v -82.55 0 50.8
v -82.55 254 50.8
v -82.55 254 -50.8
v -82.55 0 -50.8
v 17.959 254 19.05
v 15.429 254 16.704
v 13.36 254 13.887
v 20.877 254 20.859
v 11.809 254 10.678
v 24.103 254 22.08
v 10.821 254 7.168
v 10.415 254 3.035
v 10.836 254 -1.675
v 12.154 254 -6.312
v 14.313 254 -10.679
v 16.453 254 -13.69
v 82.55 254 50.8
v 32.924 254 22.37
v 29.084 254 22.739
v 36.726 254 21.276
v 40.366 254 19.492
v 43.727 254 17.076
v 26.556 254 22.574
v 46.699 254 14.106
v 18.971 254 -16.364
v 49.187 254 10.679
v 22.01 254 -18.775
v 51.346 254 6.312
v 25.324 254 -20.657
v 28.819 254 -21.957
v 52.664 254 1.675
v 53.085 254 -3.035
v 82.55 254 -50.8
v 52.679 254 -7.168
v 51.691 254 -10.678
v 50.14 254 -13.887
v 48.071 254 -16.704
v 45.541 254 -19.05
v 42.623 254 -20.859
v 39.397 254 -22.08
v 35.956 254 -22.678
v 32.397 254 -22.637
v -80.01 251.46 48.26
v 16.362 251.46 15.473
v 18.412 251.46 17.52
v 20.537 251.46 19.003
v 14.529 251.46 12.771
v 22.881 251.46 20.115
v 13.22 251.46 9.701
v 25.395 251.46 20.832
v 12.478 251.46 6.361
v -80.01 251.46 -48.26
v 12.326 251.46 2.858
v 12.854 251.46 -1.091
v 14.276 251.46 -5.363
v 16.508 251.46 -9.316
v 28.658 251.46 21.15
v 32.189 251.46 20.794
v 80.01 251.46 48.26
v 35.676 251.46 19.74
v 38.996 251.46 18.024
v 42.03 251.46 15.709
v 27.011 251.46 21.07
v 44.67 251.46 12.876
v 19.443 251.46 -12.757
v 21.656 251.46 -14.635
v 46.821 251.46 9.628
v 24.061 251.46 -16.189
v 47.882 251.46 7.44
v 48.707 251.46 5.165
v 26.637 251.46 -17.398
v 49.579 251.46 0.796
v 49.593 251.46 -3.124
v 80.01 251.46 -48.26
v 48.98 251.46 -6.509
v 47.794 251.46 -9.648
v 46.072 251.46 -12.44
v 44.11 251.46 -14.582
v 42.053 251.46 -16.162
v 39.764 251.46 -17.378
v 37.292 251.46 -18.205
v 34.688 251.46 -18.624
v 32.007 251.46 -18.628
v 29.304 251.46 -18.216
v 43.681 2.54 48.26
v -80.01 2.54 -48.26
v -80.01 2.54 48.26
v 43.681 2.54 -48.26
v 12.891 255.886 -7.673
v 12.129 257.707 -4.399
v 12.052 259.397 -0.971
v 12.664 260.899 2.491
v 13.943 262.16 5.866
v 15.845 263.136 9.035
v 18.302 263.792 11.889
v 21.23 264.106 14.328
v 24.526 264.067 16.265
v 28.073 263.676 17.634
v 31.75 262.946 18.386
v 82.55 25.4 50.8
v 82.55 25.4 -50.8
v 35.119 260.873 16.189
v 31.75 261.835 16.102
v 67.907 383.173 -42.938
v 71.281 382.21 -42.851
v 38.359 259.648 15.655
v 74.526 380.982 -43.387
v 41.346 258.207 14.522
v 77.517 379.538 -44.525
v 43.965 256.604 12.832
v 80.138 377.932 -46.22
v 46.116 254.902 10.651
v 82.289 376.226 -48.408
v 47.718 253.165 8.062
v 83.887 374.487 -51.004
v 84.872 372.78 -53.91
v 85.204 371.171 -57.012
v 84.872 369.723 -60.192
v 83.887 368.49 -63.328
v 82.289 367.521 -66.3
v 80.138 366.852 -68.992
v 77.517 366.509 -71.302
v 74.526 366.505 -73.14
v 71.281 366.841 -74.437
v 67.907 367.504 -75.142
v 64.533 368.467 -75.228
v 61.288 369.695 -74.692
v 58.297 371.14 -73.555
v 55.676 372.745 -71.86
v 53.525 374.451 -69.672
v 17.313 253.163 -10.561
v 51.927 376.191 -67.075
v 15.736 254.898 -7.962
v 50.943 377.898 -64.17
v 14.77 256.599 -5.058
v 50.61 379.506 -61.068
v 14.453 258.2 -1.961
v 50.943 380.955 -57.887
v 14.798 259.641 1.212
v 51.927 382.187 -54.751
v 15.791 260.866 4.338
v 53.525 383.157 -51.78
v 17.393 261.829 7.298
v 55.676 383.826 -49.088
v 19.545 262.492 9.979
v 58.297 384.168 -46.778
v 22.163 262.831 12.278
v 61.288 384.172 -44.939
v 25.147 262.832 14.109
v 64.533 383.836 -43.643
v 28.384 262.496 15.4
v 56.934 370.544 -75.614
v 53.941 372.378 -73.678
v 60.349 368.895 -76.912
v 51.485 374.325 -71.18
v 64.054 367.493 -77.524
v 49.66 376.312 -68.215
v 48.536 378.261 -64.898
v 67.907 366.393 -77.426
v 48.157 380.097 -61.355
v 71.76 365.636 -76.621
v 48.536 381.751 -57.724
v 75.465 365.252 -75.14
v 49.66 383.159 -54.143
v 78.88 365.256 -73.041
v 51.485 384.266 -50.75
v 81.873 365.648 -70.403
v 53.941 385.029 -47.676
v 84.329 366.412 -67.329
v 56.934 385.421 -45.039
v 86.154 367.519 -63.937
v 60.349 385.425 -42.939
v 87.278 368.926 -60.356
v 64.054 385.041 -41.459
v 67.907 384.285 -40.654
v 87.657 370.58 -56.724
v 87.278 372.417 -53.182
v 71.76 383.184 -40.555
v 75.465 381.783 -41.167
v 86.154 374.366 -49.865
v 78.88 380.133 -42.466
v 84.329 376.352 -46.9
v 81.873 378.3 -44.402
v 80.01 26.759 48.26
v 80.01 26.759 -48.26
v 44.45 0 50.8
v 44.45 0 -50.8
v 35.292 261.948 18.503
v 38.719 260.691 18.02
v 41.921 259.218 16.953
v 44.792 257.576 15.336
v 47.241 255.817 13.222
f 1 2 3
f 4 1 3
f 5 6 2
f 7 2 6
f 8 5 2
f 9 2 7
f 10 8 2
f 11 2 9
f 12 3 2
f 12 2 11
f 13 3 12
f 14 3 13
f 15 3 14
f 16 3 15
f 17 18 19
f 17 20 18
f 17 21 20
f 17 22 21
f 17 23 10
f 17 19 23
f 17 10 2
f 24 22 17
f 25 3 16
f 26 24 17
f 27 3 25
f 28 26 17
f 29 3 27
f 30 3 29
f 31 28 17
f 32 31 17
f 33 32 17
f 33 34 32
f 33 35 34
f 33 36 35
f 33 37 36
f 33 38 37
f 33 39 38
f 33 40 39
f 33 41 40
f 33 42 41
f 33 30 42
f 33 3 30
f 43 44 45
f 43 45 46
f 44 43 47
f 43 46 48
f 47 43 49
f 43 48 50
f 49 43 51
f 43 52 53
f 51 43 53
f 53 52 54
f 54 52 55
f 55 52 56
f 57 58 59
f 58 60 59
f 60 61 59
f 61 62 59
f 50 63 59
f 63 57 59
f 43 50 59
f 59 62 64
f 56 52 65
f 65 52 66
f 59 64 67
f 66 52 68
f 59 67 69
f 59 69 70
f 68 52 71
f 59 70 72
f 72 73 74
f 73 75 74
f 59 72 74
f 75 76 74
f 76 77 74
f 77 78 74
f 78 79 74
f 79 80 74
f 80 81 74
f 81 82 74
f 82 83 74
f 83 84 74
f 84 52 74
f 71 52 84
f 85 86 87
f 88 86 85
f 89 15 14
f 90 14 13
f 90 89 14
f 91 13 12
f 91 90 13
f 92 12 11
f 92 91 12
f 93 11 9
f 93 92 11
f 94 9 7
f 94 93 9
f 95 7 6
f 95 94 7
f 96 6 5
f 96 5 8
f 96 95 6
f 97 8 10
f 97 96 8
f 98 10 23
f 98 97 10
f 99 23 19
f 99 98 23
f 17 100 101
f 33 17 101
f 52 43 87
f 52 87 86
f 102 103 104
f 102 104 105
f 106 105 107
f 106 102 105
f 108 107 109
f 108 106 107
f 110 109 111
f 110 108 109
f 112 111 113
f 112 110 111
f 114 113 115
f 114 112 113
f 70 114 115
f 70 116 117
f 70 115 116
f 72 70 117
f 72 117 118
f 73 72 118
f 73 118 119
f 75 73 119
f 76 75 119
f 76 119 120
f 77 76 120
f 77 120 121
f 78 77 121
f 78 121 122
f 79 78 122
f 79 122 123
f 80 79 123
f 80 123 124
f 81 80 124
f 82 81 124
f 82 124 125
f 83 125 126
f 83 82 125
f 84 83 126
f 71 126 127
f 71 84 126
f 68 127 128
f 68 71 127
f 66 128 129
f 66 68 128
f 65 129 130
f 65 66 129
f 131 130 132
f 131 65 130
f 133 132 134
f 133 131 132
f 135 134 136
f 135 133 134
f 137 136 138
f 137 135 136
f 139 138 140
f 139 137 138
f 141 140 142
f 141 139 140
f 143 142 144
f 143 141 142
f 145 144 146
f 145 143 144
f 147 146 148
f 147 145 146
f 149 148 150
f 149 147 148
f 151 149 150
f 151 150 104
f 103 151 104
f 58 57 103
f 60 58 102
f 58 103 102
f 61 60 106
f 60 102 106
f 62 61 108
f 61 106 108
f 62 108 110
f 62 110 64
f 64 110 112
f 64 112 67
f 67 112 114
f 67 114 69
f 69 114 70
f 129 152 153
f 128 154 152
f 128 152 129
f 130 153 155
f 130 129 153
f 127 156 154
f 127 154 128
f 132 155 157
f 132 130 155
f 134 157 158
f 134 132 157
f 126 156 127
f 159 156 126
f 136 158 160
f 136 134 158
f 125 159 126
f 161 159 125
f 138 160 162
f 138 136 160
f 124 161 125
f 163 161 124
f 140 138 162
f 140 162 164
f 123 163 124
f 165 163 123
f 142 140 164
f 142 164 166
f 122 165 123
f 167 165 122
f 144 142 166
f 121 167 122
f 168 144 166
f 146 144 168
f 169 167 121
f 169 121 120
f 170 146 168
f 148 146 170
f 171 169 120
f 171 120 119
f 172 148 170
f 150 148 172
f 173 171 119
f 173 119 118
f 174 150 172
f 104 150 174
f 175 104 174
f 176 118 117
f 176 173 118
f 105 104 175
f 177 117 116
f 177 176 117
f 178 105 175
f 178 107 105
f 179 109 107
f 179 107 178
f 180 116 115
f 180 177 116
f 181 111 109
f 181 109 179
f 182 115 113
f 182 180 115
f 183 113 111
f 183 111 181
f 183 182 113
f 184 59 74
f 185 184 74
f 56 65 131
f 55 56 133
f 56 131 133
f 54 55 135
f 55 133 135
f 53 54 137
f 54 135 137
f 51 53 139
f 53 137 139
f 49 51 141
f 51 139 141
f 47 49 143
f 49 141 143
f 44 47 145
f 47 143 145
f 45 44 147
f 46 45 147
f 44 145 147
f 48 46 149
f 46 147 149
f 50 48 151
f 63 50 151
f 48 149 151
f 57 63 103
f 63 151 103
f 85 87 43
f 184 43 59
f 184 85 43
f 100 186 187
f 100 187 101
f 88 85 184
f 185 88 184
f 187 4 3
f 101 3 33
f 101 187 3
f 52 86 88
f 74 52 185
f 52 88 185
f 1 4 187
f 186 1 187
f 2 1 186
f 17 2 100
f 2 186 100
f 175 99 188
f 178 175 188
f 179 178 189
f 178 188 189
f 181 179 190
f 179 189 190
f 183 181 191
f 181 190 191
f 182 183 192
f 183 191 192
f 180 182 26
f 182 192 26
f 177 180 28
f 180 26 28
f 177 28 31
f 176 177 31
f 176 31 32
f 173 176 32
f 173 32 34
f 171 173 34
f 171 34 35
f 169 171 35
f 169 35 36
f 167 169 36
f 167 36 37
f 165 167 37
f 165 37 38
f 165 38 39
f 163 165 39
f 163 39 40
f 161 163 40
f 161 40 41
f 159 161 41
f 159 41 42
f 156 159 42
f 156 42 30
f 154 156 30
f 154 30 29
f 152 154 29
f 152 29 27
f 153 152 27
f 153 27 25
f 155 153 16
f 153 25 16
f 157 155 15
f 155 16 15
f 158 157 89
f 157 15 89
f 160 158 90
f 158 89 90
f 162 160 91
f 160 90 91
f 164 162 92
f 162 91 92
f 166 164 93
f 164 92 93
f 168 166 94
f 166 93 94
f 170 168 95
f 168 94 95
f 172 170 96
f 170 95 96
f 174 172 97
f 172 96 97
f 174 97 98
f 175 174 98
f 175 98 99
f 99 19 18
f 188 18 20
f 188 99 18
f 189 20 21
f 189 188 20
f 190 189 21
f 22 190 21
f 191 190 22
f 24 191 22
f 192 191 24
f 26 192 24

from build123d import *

# Parameters (mm, degrees)
SKETCH1_W                       = 165.1
SKETCH1_H                       = 101.6
BOSS_EXTRUDE1_DEPTH             = 254
CUT_EXTRUDE1_DEPTH              = 254
SKETCH5_R                       = 20.447
BOSS_EXTRUDE3_DEPTH             = 139.7
BOSS_EXTRUDE3_DIRECTION_2_REACH = 285.127
SHELL2_T                        = -2.54


with BuildPart() as part:
    # Sketch1 → Boss-Extrude1 (new body)
    with BuildSketch(Plane(origin=(0, 0, 0), x_dir=(1, 0, 0), z_dir=(0, 1, 0))):
        Rectangle(SKETCH1_W, SKETCH1_H)
    extrude(amount=BOSS_EXTRUDE1_DEPTH)

    # Sketch2 → Cut-Extrude1 (cut)
    with BuildSketch(Plane(origin=(0, 0, -50.8), x_dir=(-1, 0, 0), z_dir=(0, 0, -1))):
        Polygon((-44.45, 0), (-82.55, 25.4), (-82.55, 0), align=None)
    extrude(amount=-CUT_EXTRUDE1_DEPTH, mode=Mode.SUBTRACT)

    # Sketch5 → Boss-Extrude3 (add)
    with BuildSketch(Plane(origin=(31.75, 254, 0), x_dir=(0.9657919899307167, -0.2399824072752947, 0.09825617733263003), z_dir=(0.2588190451025181, 0.8685657757104482, -0.422618261740697))):
        with Locations(Location((0, 0, 0), (0, 0, 269.046198917))):
            Circle(SKETCH5_R)
    extrude(amount=BOSS_EXTRUDE3_DEPTH)

    # Boss-Extrude3 direction 2: up to this face of the body (flat: up to its plane)
    boss_extrude3_direction_2_end = Plane(part.part.faces().sort_by_distance((0, 254, 0))[0])
    # Sketch5 → Boss-Extrude3 direction 2 (add, up to the picked face)
    with BuildSketch(Plane(origin=(31.75, 254, 0), x_dir=(0.9657919899307167, -0.2399824072752947, 0.09825617733263003), z_dir=(0.2588190451025181, 0.8685657757104482, -0.422618261740697)), mode=Mode.PRIVATE) as boss_extrude3_direction_2_sk1:
        with Locations(Location((0, 0, 0), (0, 0, 269.046198917))):
            Circle(SKETCH5_R)
    boss_extrude3_direction_2_tool1 = split(extrude(boss_extrude3_direction_2_sk1.sketch, amount=-BOSS_EXTRUDE3_DIRECTION_2_REACH, mode=Mode.PRIVATE), bisect_by=boss_extrude3_direction_2_end, keep=Keep.BOTH, mode=Mode.PRIVATE)
    add(boss_extrude3_direction_2_tool1.solids().sort_by(Axis((31.75, 254, 0), (-0.2588190451025181, -0.8685657757104482, 0.422618261740697)))[0])

    # Shell2
    shell2_openings = [part.faces().sort_by_distance(p)[0] for p in [
        (67.907020601, 375.338638867, -59.039771165),
    ]]
    offset(amount=SHELL2_T, openings=shell2_openings, kind=Kind.INTERSECTION)


solid = part.part
